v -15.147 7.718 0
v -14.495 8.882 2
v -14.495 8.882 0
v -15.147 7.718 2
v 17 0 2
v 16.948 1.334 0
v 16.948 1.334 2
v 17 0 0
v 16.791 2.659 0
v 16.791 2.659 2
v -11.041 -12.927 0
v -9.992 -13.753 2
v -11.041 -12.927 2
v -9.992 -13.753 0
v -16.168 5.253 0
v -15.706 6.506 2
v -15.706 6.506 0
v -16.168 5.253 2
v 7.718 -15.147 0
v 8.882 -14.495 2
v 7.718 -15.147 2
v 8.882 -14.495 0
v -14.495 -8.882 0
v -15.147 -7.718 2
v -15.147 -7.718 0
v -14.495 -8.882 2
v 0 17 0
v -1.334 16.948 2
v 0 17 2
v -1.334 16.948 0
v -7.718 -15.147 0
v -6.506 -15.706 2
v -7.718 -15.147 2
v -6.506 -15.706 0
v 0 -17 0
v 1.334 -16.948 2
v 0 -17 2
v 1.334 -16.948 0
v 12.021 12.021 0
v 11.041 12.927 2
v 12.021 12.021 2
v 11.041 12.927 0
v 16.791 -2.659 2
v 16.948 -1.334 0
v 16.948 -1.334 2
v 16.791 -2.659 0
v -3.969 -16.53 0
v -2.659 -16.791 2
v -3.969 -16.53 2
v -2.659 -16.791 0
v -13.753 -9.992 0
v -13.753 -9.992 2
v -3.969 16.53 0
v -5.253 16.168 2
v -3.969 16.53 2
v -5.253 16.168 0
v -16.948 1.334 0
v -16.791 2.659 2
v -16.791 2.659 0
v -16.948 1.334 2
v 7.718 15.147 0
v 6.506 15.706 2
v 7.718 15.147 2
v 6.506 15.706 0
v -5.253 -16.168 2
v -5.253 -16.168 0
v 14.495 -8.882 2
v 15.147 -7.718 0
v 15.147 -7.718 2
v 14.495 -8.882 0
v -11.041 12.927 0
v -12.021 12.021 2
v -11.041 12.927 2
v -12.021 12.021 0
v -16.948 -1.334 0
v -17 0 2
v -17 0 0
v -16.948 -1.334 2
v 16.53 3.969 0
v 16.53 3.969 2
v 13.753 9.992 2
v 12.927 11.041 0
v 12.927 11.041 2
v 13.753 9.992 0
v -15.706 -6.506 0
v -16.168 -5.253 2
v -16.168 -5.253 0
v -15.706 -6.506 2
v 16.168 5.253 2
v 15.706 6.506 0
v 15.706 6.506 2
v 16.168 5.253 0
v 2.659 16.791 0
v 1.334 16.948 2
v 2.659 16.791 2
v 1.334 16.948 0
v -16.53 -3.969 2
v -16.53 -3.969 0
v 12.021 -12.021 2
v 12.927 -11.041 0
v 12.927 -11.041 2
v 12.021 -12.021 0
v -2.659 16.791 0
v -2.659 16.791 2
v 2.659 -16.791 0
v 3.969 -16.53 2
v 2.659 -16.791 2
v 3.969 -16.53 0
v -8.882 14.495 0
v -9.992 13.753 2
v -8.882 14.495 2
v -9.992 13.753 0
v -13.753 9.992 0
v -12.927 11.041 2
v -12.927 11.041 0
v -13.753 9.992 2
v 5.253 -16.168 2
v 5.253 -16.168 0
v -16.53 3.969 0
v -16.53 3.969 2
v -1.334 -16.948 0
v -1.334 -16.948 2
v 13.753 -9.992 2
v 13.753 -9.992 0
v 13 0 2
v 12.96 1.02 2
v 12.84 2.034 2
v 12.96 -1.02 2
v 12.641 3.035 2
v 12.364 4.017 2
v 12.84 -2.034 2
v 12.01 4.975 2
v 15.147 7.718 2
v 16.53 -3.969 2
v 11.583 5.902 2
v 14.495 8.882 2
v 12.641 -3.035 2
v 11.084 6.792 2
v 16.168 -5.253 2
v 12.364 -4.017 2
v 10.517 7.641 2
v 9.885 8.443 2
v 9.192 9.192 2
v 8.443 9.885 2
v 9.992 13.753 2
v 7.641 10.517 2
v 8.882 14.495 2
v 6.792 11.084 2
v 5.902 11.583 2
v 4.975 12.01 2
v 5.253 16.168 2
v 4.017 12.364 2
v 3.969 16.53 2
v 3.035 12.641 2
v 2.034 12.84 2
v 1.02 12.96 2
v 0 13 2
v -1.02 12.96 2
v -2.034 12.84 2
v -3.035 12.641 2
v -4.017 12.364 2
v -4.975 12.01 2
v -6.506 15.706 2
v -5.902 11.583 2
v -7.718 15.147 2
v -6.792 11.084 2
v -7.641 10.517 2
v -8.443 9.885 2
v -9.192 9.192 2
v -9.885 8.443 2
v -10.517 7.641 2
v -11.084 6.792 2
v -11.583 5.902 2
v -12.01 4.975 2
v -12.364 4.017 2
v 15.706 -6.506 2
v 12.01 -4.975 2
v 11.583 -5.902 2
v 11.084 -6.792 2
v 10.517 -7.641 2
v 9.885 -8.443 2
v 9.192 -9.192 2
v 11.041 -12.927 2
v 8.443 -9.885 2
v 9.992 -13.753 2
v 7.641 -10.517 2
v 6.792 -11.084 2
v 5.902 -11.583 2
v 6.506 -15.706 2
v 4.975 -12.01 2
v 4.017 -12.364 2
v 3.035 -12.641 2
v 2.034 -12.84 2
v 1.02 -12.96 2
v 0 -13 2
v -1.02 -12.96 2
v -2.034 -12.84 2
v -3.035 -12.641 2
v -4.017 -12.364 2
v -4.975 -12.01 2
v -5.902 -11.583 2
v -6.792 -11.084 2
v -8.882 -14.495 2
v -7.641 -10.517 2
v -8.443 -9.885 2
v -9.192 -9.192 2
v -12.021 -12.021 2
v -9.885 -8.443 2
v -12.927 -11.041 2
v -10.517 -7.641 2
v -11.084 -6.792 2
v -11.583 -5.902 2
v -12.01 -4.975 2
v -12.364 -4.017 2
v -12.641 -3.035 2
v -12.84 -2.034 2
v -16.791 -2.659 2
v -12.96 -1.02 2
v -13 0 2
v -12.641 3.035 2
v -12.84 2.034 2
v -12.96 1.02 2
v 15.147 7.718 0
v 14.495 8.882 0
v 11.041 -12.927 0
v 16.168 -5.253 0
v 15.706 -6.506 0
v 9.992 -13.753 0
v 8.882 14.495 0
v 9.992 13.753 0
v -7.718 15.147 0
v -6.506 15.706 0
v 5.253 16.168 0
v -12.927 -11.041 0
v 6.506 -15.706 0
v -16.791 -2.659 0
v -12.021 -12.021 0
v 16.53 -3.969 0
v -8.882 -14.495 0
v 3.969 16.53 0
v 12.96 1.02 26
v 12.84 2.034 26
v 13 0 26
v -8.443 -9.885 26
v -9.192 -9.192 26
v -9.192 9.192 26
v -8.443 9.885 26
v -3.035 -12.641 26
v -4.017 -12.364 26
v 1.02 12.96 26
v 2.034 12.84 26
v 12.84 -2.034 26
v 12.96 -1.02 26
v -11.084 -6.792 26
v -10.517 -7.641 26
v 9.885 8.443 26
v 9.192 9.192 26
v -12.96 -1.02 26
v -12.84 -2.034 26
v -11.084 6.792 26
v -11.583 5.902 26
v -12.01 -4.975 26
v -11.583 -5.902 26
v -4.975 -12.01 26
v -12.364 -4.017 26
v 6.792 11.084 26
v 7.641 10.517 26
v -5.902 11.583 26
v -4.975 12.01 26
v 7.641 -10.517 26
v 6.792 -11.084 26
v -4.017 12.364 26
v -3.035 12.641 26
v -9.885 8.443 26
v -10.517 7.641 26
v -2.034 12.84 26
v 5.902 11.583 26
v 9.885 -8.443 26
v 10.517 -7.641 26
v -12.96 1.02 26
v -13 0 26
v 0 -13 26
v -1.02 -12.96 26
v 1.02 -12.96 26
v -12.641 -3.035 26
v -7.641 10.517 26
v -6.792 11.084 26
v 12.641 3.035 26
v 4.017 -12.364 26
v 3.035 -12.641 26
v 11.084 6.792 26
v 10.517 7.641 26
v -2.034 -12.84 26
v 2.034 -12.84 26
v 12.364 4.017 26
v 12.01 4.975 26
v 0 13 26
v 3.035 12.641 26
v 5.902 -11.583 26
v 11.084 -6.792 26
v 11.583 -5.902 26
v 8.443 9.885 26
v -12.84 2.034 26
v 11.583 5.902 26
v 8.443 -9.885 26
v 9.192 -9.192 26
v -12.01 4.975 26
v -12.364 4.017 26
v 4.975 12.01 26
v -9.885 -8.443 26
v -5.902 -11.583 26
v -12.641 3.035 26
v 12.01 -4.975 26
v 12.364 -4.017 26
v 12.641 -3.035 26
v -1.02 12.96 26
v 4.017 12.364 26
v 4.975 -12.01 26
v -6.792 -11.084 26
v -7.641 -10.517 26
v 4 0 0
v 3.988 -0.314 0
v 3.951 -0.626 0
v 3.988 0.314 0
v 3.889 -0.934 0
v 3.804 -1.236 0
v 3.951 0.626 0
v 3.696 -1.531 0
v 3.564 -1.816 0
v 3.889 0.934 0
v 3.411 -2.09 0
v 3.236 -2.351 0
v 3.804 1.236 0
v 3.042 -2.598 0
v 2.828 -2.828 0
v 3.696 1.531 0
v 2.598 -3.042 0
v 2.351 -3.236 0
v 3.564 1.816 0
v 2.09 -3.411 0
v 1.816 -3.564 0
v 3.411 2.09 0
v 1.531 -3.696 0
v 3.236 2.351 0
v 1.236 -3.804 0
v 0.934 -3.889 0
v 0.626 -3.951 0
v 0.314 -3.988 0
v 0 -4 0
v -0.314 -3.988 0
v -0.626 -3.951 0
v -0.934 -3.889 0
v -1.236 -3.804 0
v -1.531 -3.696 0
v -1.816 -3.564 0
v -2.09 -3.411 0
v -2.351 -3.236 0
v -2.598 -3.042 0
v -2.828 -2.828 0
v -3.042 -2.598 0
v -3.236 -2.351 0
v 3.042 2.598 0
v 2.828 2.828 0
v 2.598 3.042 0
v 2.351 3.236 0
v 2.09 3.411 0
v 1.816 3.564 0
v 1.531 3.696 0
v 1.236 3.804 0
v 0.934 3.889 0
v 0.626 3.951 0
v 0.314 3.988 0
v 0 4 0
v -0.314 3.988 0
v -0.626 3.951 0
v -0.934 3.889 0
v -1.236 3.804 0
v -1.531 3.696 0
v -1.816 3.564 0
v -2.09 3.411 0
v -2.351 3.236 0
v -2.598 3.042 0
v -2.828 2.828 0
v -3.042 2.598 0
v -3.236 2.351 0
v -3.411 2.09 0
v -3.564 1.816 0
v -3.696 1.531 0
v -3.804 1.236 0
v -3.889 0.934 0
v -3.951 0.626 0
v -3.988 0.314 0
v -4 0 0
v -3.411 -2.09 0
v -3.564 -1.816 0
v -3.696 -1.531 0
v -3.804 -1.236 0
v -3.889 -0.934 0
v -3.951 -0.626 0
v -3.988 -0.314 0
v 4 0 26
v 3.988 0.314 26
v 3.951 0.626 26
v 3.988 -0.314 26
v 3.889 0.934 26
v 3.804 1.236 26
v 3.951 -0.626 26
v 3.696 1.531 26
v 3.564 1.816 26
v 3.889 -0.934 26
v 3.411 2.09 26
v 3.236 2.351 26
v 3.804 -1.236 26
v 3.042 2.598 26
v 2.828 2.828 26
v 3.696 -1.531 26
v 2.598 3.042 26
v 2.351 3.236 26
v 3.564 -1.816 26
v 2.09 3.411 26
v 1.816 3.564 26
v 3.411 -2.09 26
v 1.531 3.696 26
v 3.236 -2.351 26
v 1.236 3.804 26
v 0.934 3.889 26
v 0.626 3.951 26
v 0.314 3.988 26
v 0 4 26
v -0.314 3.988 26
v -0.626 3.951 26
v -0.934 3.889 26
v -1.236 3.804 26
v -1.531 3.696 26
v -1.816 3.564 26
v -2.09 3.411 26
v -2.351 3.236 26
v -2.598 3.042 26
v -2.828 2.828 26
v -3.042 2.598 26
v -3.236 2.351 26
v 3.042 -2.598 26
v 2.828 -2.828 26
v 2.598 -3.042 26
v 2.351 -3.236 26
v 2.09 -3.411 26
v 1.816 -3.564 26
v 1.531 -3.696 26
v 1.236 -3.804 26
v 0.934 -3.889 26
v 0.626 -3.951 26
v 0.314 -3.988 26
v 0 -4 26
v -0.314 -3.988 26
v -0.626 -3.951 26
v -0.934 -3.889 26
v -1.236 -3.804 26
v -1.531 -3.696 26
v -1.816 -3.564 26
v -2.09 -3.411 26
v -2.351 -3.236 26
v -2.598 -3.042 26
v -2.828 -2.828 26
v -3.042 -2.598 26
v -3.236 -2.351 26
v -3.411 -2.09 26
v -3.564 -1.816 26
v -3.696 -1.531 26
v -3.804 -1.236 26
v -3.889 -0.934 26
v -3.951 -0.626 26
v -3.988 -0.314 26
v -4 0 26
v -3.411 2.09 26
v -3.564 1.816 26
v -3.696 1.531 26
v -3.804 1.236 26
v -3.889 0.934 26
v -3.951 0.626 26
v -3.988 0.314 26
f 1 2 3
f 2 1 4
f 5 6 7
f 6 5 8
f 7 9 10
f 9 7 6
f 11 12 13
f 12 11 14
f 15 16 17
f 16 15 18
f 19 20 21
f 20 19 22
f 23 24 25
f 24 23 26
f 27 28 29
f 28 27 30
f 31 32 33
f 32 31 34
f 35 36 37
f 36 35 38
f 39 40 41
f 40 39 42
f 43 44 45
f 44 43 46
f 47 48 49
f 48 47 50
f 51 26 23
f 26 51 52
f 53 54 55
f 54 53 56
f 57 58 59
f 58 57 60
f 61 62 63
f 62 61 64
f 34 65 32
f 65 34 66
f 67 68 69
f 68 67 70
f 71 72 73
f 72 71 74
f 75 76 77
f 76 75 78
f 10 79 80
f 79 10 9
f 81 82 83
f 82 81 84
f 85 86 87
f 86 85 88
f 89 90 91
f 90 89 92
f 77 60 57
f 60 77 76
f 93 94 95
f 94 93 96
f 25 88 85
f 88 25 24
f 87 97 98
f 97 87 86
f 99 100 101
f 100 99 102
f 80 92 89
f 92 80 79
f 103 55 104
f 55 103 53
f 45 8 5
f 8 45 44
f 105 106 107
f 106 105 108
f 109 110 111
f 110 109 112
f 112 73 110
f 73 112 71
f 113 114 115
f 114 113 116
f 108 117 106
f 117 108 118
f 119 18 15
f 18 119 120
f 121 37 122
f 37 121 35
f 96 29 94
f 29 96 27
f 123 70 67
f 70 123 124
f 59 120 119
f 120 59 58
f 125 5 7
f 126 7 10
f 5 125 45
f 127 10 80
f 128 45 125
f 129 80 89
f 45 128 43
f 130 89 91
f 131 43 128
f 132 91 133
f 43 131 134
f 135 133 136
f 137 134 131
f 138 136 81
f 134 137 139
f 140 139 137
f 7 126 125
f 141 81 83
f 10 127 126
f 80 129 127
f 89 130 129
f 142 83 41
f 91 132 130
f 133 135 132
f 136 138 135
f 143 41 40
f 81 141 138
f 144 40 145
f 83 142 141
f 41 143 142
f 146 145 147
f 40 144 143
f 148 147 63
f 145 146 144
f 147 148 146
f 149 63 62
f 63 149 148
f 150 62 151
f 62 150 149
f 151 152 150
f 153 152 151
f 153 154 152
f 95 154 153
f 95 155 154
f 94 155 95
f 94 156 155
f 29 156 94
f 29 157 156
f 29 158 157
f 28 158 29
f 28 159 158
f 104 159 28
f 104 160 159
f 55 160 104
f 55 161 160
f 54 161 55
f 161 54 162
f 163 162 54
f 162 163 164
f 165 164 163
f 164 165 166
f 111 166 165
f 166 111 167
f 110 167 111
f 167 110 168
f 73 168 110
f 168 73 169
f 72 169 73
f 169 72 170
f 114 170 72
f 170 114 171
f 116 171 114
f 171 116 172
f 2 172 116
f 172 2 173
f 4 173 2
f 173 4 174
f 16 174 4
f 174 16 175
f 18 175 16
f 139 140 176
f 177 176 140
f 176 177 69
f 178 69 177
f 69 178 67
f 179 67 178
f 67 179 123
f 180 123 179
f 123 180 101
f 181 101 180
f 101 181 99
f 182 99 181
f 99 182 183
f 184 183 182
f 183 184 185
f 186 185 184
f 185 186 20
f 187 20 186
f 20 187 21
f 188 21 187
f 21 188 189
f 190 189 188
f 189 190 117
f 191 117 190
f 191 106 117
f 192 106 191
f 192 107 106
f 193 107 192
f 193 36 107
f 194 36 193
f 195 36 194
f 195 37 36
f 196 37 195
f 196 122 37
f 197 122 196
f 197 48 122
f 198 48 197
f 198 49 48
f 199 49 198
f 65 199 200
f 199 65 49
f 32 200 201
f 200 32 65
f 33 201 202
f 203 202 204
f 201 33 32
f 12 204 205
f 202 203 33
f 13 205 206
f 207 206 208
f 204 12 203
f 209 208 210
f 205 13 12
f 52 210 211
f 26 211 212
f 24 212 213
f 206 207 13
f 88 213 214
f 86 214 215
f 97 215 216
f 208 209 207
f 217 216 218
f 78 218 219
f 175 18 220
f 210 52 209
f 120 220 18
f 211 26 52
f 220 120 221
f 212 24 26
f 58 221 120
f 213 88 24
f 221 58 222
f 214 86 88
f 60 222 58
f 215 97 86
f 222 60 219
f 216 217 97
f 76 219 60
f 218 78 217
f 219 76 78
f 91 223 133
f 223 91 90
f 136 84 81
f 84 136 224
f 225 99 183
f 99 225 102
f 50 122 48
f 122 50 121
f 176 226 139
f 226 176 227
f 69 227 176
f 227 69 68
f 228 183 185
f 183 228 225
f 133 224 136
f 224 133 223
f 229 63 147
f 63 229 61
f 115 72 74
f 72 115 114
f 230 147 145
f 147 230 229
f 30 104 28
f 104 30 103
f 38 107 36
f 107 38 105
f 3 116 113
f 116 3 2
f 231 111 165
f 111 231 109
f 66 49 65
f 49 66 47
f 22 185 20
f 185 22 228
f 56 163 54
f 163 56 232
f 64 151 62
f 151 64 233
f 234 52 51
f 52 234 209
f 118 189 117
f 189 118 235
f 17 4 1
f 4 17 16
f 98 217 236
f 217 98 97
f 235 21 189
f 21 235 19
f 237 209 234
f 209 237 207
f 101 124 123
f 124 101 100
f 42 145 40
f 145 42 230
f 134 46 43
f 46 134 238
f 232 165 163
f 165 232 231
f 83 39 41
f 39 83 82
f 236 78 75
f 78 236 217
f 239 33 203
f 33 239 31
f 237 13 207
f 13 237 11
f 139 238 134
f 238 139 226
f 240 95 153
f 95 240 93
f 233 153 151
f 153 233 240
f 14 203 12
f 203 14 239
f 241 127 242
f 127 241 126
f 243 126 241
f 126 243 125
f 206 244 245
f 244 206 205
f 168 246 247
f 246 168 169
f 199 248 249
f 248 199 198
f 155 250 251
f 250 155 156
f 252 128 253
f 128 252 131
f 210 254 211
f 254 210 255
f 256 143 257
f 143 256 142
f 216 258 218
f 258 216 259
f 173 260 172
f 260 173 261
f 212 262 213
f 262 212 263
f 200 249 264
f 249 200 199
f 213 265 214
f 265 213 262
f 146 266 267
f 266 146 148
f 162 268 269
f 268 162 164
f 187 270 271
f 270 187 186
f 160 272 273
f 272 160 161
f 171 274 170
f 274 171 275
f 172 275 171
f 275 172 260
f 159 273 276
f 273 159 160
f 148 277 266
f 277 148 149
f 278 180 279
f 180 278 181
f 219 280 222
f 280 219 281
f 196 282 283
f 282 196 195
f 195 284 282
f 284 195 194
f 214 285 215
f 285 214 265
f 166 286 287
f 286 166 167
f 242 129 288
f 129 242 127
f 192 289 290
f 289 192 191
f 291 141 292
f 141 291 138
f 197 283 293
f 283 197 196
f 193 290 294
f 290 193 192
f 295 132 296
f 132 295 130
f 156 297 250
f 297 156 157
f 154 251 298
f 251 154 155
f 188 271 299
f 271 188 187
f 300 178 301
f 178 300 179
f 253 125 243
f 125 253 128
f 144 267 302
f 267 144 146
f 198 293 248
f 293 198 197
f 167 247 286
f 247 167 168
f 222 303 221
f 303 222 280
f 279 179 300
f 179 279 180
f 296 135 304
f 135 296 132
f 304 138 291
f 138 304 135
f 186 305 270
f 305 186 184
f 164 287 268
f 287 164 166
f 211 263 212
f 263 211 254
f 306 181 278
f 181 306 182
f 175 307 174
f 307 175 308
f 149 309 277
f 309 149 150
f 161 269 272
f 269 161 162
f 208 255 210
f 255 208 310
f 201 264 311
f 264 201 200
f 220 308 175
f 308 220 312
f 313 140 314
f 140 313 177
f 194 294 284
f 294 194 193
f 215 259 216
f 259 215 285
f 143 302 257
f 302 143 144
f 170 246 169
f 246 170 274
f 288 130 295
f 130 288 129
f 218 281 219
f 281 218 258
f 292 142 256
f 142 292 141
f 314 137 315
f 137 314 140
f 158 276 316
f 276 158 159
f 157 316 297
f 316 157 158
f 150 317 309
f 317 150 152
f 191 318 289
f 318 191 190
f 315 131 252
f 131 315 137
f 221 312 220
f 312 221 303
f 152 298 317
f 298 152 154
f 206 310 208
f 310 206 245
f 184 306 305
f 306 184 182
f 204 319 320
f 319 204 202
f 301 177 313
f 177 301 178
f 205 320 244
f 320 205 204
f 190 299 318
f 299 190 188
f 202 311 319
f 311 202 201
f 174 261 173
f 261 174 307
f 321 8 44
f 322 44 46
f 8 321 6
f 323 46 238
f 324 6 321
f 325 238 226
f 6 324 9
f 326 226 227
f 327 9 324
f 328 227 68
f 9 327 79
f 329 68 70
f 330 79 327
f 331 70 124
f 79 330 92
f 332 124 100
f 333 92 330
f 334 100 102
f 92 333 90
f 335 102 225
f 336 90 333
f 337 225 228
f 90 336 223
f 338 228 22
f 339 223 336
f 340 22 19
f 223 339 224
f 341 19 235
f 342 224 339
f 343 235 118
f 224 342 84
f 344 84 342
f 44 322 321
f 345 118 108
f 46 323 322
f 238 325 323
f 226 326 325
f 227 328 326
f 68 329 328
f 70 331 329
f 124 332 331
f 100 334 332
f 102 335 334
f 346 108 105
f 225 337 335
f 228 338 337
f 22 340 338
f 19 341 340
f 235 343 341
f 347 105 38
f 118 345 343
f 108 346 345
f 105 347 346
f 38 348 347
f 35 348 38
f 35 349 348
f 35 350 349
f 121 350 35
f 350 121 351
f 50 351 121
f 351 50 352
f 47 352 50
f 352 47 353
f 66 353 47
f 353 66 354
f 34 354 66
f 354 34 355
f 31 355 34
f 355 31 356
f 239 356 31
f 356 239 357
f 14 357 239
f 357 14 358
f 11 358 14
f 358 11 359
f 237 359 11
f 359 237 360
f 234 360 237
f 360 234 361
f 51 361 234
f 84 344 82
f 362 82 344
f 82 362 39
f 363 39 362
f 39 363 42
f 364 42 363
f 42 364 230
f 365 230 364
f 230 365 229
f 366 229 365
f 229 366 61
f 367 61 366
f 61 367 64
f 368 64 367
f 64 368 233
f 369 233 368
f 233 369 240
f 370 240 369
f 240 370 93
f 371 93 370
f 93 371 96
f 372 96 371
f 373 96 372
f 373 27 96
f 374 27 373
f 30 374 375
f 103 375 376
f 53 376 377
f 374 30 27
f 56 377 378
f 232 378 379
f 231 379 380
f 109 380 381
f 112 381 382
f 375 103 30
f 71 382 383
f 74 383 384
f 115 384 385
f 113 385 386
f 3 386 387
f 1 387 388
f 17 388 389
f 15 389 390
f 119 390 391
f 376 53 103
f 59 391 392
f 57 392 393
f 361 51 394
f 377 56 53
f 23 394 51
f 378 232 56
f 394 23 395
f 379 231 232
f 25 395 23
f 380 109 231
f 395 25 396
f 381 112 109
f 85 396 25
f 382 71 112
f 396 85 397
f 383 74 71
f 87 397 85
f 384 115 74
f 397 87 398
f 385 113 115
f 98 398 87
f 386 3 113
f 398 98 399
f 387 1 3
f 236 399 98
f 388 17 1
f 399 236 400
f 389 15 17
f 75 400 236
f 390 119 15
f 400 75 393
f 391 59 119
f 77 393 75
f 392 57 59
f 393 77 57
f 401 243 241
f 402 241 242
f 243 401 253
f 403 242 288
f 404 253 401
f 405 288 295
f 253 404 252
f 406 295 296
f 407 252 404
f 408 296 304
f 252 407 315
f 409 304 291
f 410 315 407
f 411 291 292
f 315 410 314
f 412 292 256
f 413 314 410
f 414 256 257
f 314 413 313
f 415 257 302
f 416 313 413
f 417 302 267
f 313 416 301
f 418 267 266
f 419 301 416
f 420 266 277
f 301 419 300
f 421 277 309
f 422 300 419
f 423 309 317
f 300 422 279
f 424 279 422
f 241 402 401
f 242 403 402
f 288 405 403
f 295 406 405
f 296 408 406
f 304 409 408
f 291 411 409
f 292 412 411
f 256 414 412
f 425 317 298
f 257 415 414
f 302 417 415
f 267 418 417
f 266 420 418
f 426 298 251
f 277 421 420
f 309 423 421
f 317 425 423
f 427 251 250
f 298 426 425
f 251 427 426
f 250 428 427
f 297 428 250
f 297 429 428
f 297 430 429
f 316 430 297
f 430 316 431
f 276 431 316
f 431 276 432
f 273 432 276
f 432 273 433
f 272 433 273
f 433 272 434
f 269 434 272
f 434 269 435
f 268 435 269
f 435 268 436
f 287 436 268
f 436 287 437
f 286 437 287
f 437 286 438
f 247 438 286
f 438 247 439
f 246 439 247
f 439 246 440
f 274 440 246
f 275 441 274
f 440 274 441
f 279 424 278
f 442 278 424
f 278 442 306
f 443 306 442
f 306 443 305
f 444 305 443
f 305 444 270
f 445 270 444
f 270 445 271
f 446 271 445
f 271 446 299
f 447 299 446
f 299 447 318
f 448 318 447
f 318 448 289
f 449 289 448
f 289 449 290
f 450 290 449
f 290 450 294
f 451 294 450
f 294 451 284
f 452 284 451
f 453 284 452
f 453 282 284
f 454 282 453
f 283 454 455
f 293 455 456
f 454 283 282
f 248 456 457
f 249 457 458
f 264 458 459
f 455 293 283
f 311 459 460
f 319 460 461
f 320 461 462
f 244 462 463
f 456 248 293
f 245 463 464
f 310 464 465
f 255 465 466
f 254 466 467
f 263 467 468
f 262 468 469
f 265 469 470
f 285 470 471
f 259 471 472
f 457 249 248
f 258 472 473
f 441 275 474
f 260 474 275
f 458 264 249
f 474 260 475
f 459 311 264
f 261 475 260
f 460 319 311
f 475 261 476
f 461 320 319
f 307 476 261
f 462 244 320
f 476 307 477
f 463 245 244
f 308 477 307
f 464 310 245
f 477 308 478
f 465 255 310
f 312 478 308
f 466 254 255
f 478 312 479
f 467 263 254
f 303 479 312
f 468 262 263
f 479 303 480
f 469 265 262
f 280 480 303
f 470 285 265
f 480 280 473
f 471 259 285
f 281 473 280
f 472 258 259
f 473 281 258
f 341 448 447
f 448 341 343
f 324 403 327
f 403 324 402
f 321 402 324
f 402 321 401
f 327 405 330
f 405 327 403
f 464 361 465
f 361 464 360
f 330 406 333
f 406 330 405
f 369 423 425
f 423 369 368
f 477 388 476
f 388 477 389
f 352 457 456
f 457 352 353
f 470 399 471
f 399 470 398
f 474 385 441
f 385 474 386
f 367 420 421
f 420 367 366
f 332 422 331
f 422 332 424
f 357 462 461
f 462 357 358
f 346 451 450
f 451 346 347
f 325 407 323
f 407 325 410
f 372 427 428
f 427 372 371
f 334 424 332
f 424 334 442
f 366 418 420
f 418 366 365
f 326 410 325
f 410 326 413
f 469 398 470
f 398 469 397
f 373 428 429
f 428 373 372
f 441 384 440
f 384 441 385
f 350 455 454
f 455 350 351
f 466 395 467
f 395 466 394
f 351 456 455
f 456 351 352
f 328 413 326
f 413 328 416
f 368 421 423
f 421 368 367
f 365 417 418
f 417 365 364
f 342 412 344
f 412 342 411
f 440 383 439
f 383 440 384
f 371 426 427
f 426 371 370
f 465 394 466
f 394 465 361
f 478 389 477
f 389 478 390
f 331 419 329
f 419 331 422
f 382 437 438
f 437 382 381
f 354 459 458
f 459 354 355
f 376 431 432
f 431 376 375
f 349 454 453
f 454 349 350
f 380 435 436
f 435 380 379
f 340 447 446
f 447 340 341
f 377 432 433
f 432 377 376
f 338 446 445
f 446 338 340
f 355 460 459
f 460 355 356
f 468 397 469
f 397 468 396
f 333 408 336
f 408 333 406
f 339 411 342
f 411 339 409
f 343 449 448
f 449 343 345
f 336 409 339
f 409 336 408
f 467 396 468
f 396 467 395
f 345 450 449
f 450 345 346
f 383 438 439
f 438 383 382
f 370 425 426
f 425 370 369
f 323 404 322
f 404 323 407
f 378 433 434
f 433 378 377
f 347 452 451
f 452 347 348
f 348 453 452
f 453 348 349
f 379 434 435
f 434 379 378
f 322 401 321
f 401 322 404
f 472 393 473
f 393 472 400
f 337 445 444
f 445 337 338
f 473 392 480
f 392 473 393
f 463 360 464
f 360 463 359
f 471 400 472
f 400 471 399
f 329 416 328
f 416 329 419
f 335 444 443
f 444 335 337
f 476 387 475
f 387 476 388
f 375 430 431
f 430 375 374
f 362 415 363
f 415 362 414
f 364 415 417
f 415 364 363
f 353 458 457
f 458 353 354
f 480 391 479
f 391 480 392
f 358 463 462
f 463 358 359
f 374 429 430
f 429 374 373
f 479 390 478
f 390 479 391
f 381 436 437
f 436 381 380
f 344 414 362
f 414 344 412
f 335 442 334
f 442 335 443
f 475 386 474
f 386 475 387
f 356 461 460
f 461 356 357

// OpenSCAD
$fn = 80;

difference(){
    cylinder(d=34,h=26);
    cylinder(r=4,h=26);
    
    translate([0,0,2])difference(){
        cylinder(d=34,h=26);
        cylinder(d=26,h=26);
    }
}
